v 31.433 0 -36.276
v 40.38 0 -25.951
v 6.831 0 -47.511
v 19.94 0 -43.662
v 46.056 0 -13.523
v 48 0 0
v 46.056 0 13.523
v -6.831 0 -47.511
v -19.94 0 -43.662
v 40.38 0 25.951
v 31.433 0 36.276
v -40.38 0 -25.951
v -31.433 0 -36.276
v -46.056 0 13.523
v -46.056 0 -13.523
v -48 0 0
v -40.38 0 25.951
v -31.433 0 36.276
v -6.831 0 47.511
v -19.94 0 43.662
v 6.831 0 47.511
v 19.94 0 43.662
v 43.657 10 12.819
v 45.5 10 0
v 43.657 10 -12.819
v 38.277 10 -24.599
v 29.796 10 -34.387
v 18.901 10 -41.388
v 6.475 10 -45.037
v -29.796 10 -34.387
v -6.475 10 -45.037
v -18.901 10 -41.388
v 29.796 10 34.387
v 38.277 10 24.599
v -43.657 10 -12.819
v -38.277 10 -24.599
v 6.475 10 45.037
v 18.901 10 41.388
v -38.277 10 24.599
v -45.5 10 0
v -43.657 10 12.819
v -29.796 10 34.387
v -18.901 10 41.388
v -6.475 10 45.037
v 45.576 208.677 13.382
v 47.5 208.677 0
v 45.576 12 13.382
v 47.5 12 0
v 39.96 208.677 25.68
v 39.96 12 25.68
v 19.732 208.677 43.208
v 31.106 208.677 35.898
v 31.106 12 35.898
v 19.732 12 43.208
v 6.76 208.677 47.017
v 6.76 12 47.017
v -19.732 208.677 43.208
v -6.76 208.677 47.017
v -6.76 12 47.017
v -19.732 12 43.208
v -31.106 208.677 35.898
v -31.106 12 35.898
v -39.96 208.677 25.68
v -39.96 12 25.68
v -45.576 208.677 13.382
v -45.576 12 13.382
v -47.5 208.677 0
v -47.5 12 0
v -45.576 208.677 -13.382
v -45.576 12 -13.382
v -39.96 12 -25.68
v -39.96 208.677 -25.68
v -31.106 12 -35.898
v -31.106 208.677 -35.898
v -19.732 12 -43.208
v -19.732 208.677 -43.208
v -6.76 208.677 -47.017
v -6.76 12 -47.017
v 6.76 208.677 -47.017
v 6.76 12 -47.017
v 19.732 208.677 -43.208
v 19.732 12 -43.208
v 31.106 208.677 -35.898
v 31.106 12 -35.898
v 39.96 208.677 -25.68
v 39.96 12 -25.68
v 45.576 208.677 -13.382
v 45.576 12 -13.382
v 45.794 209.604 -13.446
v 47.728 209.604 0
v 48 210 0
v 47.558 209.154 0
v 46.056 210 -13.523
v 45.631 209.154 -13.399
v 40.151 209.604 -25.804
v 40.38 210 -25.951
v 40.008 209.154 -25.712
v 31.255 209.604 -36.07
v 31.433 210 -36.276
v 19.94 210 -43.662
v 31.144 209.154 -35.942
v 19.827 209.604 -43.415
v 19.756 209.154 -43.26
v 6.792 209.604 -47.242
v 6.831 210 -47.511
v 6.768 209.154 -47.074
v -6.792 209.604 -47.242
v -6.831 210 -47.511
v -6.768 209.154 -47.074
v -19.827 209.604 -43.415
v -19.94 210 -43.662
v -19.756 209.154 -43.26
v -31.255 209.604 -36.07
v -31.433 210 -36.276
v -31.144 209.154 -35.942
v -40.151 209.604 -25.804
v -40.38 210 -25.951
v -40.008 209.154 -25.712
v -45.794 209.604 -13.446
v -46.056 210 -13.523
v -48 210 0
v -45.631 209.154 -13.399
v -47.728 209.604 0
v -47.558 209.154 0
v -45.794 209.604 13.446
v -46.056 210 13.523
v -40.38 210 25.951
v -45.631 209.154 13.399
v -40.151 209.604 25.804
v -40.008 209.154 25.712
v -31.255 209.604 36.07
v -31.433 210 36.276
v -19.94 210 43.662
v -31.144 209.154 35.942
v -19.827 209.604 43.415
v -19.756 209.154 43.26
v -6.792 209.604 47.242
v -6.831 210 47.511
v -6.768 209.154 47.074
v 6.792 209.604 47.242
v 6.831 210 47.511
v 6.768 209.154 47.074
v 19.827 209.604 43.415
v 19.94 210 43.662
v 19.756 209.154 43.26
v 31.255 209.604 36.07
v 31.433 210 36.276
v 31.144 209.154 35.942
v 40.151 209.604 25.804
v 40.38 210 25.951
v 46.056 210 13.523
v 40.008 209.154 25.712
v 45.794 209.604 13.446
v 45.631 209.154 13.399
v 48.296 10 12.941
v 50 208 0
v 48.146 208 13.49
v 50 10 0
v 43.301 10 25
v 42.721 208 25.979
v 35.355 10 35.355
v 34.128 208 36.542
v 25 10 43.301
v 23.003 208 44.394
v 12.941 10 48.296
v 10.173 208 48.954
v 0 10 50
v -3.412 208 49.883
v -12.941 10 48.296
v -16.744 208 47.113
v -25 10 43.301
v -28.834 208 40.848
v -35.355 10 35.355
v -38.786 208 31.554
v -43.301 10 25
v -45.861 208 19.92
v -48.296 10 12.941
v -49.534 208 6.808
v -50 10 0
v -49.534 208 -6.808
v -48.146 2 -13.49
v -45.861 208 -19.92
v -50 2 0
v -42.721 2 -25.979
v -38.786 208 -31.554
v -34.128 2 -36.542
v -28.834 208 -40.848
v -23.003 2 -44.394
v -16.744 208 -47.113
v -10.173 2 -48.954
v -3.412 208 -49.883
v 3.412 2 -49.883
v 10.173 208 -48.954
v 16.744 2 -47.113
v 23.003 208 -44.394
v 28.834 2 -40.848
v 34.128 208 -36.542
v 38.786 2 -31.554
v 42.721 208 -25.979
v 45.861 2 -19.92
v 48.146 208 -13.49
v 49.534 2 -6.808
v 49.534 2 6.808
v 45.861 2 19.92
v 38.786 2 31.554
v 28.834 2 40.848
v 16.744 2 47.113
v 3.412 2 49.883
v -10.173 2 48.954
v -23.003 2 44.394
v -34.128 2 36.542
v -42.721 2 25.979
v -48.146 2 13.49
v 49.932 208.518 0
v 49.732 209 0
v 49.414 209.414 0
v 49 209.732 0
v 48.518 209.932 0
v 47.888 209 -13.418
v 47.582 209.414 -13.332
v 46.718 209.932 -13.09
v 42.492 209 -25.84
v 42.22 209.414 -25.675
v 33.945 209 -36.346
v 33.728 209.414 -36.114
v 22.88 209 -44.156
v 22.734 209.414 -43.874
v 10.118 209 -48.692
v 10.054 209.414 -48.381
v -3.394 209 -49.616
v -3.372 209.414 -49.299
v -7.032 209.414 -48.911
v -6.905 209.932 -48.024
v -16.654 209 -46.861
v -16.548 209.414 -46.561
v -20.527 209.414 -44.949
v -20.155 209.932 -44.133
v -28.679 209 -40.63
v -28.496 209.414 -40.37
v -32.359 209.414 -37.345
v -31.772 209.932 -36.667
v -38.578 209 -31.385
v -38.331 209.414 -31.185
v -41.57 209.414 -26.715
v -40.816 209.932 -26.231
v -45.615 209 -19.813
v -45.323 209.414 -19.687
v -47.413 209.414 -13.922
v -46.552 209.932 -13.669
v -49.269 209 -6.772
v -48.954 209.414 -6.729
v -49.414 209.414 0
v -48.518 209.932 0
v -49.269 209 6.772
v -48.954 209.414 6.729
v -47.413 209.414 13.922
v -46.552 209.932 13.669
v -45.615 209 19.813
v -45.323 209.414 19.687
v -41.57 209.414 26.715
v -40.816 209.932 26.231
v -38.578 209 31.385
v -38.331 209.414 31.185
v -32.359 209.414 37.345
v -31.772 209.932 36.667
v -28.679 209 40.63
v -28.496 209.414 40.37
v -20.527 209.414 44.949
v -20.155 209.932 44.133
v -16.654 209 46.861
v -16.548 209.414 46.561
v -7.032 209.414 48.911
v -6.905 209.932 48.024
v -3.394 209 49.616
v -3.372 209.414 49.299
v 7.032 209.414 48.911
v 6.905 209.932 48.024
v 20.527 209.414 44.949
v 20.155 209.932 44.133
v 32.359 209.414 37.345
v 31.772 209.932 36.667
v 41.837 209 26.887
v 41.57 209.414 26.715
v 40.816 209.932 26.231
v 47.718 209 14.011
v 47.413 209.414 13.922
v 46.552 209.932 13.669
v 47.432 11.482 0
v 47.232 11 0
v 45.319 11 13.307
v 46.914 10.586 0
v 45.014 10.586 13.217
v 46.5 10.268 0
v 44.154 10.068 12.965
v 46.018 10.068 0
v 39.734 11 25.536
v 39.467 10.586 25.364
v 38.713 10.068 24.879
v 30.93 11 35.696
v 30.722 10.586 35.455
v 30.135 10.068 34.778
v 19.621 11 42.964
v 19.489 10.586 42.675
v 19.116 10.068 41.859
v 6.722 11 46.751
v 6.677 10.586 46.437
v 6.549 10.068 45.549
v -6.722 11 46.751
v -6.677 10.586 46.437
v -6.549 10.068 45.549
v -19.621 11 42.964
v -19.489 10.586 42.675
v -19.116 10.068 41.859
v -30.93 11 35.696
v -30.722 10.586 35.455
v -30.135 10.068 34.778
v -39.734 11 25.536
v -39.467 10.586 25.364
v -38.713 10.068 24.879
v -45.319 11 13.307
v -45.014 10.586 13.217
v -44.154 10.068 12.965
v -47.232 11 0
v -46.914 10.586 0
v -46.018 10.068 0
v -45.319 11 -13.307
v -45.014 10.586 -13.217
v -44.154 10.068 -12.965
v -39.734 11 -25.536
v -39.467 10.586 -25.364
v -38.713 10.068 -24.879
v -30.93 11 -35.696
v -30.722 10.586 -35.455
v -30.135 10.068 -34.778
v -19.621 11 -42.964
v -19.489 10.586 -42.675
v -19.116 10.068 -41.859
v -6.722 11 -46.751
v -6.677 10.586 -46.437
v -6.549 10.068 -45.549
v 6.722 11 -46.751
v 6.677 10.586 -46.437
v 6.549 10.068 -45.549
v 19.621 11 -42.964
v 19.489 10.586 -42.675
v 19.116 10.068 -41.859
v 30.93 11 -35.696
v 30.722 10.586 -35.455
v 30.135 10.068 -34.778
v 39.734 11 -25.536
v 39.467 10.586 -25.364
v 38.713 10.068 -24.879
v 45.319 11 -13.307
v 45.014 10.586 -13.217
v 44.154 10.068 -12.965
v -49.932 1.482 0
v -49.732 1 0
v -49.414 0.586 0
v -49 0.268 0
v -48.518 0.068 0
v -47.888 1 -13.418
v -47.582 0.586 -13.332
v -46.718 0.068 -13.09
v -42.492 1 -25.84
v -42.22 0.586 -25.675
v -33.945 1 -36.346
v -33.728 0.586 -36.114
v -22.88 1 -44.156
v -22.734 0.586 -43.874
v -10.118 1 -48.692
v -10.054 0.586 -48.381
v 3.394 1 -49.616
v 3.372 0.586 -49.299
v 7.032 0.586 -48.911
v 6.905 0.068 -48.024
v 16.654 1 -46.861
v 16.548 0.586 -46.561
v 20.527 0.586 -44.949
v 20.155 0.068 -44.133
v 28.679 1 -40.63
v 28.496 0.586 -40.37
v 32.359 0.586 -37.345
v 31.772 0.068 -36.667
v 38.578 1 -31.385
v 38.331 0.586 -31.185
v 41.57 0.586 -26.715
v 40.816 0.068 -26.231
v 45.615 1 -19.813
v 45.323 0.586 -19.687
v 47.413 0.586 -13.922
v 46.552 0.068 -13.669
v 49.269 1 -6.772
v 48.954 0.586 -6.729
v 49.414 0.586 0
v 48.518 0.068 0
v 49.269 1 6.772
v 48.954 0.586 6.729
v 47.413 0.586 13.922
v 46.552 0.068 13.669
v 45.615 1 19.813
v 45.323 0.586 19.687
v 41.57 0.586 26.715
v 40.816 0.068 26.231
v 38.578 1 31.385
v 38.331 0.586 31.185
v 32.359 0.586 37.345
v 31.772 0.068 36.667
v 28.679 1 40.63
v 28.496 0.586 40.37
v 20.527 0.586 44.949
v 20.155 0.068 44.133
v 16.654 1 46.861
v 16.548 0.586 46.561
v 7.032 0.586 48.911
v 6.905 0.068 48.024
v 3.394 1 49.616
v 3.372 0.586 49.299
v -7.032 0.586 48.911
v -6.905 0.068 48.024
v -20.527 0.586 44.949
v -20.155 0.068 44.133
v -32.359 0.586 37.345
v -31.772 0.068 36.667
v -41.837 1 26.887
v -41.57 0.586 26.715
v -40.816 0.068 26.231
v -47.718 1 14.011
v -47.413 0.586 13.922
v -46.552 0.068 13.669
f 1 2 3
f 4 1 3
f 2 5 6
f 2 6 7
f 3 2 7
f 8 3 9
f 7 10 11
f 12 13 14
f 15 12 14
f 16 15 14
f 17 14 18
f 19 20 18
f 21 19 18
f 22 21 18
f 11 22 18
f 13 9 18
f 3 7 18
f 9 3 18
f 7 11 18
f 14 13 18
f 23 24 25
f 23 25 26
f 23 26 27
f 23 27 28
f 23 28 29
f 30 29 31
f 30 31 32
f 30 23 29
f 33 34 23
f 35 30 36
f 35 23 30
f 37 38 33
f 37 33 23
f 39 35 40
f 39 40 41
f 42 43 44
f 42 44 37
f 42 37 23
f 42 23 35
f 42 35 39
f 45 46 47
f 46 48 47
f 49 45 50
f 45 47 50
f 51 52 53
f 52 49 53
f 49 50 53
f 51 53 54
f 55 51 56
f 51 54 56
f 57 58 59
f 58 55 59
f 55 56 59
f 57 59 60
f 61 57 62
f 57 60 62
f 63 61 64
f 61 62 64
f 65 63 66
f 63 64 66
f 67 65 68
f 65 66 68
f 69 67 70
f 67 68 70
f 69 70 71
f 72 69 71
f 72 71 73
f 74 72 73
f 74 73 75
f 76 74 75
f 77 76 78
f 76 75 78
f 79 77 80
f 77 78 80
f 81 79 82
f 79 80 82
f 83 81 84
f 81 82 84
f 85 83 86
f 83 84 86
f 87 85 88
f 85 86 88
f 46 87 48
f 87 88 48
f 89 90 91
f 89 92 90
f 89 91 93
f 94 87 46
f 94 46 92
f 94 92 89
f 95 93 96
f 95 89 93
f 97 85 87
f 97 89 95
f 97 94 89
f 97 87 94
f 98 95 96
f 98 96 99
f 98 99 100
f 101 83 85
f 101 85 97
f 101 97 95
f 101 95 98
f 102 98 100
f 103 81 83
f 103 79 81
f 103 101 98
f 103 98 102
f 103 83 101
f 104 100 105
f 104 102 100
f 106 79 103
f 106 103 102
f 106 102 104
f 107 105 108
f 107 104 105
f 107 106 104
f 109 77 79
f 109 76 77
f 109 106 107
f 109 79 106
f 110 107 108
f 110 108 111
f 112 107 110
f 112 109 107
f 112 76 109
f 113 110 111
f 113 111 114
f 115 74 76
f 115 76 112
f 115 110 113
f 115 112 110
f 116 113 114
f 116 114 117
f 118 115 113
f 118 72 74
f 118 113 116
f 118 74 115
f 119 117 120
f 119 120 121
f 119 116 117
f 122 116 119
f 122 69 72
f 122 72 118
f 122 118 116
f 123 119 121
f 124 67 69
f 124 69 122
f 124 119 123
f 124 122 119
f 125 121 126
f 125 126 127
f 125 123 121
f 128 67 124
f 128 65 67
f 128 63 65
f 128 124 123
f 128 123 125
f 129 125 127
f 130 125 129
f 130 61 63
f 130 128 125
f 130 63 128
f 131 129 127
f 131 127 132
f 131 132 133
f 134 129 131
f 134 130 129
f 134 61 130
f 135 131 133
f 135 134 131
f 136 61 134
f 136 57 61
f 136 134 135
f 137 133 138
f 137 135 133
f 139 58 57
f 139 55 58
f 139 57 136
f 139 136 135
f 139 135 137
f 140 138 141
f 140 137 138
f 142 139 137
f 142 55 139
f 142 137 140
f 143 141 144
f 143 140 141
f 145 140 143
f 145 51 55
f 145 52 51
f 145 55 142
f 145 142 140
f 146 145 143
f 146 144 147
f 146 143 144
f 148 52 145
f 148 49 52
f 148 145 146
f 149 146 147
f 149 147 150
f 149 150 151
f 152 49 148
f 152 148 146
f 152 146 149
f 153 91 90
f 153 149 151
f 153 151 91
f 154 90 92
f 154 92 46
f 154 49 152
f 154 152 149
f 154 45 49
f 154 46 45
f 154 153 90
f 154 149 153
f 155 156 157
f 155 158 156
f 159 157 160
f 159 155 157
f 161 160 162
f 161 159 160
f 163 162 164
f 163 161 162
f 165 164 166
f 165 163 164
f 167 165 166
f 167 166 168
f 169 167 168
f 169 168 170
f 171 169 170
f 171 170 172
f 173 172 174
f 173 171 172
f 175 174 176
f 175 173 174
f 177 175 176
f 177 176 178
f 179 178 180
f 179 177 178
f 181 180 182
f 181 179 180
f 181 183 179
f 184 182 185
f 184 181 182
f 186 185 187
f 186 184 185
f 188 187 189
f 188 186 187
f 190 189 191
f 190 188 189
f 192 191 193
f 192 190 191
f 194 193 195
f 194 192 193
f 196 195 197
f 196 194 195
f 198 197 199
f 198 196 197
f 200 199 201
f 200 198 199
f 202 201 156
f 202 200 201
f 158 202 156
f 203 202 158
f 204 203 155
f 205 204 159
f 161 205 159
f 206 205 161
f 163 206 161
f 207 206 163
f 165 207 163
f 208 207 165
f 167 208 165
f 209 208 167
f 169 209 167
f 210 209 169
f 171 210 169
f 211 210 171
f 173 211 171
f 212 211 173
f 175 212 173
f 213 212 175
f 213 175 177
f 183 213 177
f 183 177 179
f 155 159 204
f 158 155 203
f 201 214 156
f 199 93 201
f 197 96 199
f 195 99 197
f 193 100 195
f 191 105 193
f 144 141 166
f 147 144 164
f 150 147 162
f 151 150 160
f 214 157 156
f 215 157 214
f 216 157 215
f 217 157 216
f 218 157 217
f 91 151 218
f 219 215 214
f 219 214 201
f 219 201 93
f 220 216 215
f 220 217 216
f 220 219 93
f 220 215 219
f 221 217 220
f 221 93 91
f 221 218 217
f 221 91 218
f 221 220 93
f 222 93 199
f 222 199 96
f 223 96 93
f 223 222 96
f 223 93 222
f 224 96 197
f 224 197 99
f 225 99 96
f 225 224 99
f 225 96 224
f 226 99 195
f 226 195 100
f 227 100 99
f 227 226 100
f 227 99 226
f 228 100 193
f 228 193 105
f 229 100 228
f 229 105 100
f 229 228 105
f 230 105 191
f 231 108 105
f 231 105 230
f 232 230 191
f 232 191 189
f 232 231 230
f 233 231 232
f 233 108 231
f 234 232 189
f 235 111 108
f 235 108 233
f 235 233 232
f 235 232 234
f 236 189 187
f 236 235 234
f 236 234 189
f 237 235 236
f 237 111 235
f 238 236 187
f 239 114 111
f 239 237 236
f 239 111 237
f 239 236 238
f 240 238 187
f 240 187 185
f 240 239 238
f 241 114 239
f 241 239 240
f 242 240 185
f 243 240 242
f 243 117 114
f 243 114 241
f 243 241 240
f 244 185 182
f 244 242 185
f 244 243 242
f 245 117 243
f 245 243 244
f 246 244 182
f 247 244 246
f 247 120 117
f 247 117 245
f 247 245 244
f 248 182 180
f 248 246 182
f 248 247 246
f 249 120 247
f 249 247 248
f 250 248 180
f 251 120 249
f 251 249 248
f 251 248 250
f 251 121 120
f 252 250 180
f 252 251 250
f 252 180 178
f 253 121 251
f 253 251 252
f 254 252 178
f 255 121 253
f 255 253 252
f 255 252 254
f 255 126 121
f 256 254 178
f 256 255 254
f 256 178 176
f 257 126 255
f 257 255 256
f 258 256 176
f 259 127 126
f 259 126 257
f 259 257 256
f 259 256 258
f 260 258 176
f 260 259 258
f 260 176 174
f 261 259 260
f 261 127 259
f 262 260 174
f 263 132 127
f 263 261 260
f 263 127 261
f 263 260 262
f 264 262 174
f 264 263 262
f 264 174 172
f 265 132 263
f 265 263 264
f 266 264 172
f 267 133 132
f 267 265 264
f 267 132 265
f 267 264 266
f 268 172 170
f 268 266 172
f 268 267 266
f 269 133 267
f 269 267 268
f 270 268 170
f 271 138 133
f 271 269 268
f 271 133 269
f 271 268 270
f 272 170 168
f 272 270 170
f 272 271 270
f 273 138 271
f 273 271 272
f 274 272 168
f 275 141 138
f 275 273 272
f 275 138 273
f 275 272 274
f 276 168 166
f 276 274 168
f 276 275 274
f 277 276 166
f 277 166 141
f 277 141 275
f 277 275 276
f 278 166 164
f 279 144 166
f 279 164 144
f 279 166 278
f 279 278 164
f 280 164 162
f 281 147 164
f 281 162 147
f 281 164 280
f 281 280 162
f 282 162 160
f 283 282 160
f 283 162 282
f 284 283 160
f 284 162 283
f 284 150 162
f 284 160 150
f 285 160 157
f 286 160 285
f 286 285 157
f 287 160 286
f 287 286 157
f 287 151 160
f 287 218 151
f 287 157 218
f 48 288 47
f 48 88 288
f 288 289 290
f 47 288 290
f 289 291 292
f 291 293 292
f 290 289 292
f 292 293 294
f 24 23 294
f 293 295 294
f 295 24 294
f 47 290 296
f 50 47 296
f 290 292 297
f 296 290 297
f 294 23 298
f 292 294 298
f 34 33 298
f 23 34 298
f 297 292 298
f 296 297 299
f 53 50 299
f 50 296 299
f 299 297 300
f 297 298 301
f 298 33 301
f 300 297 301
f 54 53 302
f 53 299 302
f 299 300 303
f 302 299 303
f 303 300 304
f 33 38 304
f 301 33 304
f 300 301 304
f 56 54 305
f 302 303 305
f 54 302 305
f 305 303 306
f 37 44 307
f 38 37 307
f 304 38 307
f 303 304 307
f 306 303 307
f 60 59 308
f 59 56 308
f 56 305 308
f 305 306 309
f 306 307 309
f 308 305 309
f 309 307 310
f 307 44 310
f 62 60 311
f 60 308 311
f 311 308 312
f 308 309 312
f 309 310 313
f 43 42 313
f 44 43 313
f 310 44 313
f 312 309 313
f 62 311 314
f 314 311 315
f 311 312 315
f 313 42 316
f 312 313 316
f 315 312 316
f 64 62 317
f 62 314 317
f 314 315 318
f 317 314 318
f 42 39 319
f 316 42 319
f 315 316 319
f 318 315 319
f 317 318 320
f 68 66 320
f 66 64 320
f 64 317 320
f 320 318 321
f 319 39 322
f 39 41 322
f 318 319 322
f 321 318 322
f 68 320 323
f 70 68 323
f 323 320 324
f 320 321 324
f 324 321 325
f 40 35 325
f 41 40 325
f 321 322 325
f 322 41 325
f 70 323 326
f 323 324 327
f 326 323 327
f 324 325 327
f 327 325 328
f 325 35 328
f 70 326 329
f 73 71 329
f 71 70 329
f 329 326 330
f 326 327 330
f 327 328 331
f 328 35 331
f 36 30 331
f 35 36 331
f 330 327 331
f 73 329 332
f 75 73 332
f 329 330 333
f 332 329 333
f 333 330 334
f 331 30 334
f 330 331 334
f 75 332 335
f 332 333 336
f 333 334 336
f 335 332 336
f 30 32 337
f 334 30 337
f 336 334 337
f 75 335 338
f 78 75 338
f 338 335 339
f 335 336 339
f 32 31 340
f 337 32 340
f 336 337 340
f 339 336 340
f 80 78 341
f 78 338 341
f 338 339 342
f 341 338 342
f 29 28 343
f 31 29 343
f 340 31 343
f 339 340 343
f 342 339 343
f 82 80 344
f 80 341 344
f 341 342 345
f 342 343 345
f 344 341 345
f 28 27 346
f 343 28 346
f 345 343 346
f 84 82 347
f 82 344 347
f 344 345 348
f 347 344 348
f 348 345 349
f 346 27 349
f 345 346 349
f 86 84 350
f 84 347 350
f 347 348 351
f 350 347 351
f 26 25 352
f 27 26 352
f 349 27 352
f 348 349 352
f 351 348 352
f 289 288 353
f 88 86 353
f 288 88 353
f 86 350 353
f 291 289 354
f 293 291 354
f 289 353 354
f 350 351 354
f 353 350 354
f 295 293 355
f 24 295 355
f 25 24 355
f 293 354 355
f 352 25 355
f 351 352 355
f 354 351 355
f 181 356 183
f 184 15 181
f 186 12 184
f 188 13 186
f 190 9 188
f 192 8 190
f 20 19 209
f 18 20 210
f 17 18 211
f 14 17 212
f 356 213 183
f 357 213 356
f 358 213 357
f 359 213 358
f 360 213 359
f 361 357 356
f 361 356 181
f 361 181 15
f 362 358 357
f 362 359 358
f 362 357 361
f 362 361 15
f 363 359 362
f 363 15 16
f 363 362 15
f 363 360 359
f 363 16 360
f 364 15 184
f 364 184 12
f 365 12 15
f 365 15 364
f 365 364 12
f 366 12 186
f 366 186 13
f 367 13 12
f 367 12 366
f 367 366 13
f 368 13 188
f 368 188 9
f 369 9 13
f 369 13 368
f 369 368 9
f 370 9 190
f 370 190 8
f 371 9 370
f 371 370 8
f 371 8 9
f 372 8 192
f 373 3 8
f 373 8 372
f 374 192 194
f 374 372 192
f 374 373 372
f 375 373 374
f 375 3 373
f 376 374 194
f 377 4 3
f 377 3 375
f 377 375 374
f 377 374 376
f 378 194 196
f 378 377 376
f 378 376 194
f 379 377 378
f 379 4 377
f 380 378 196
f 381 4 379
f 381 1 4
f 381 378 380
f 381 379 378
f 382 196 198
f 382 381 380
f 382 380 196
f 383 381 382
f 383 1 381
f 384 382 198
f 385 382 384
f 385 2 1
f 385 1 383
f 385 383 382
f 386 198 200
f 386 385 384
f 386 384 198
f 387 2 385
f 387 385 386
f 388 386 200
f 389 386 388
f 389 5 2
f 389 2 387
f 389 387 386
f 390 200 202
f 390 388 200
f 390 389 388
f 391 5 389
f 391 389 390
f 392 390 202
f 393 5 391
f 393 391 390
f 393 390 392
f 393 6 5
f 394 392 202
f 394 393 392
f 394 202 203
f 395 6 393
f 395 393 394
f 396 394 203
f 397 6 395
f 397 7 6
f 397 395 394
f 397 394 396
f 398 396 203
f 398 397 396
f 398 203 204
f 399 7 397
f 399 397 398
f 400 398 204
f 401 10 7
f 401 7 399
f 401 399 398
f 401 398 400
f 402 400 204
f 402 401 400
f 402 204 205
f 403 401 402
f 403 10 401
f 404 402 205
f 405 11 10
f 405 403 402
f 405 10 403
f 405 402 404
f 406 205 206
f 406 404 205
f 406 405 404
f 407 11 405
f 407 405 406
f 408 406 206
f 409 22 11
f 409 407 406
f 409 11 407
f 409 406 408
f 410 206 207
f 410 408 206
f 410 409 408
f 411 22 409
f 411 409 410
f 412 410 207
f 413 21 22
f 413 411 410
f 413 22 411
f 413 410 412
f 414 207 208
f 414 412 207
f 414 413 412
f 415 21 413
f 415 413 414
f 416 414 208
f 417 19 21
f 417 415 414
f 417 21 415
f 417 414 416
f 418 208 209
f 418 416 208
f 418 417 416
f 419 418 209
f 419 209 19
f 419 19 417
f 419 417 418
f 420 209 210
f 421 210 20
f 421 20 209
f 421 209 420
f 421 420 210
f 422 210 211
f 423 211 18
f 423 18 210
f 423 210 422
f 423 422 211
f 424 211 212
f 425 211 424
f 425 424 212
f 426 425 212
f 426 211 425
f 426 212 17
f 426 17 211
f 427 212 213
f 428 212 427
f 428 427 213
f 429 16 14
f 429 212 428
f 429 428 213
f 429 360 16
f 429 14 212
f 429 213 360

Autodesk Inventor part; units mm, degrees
ref_plane "YZ Plane" through (0, 0, 0) normal (1, 0, 0) x (0, 1, 0)
ref_plane "XZ Plane" through (0, 0, 0) normal (0, 1, 0) x (-1, 0, 0)
ref_plane "XY Plane" through (0, 0, 0) normal (0, 0, 1) x (1, 0, 0)
sketch "Sketch2" plane through (0, 0, 0) normal (0, 1, 0) x (-1, 0, 0)
  circle A0 centre (0, 0) radius 50
  dimension "d4" = 100
extrude "Extrusion2" add sketch "Sketch2" along normal blind 10
sketch "Sketch3" plane through (0, 10, 0) normal (0, 1, 0) x (1, 0, 0)
  circle A0 centre (0, 0) radius 50
  circle A1 centre (0, 0) radius 47.5
  dimension "d7" = 100
  dimension "d8" = 95
extrude "Extrusion3" add sketch "Sketch3" along normal blind 200
fillet "Fillet1" radius 2 1 edges at (50, 0, 0)
fillet "Fillet2" radius 2 2 edges at (-50, 210, 0) (-47.5, 210, 0)
fillet "Fillet3" radius 2 1 edges at (-47.5, 10, 0)
properties part number "glass" material "Glass"
